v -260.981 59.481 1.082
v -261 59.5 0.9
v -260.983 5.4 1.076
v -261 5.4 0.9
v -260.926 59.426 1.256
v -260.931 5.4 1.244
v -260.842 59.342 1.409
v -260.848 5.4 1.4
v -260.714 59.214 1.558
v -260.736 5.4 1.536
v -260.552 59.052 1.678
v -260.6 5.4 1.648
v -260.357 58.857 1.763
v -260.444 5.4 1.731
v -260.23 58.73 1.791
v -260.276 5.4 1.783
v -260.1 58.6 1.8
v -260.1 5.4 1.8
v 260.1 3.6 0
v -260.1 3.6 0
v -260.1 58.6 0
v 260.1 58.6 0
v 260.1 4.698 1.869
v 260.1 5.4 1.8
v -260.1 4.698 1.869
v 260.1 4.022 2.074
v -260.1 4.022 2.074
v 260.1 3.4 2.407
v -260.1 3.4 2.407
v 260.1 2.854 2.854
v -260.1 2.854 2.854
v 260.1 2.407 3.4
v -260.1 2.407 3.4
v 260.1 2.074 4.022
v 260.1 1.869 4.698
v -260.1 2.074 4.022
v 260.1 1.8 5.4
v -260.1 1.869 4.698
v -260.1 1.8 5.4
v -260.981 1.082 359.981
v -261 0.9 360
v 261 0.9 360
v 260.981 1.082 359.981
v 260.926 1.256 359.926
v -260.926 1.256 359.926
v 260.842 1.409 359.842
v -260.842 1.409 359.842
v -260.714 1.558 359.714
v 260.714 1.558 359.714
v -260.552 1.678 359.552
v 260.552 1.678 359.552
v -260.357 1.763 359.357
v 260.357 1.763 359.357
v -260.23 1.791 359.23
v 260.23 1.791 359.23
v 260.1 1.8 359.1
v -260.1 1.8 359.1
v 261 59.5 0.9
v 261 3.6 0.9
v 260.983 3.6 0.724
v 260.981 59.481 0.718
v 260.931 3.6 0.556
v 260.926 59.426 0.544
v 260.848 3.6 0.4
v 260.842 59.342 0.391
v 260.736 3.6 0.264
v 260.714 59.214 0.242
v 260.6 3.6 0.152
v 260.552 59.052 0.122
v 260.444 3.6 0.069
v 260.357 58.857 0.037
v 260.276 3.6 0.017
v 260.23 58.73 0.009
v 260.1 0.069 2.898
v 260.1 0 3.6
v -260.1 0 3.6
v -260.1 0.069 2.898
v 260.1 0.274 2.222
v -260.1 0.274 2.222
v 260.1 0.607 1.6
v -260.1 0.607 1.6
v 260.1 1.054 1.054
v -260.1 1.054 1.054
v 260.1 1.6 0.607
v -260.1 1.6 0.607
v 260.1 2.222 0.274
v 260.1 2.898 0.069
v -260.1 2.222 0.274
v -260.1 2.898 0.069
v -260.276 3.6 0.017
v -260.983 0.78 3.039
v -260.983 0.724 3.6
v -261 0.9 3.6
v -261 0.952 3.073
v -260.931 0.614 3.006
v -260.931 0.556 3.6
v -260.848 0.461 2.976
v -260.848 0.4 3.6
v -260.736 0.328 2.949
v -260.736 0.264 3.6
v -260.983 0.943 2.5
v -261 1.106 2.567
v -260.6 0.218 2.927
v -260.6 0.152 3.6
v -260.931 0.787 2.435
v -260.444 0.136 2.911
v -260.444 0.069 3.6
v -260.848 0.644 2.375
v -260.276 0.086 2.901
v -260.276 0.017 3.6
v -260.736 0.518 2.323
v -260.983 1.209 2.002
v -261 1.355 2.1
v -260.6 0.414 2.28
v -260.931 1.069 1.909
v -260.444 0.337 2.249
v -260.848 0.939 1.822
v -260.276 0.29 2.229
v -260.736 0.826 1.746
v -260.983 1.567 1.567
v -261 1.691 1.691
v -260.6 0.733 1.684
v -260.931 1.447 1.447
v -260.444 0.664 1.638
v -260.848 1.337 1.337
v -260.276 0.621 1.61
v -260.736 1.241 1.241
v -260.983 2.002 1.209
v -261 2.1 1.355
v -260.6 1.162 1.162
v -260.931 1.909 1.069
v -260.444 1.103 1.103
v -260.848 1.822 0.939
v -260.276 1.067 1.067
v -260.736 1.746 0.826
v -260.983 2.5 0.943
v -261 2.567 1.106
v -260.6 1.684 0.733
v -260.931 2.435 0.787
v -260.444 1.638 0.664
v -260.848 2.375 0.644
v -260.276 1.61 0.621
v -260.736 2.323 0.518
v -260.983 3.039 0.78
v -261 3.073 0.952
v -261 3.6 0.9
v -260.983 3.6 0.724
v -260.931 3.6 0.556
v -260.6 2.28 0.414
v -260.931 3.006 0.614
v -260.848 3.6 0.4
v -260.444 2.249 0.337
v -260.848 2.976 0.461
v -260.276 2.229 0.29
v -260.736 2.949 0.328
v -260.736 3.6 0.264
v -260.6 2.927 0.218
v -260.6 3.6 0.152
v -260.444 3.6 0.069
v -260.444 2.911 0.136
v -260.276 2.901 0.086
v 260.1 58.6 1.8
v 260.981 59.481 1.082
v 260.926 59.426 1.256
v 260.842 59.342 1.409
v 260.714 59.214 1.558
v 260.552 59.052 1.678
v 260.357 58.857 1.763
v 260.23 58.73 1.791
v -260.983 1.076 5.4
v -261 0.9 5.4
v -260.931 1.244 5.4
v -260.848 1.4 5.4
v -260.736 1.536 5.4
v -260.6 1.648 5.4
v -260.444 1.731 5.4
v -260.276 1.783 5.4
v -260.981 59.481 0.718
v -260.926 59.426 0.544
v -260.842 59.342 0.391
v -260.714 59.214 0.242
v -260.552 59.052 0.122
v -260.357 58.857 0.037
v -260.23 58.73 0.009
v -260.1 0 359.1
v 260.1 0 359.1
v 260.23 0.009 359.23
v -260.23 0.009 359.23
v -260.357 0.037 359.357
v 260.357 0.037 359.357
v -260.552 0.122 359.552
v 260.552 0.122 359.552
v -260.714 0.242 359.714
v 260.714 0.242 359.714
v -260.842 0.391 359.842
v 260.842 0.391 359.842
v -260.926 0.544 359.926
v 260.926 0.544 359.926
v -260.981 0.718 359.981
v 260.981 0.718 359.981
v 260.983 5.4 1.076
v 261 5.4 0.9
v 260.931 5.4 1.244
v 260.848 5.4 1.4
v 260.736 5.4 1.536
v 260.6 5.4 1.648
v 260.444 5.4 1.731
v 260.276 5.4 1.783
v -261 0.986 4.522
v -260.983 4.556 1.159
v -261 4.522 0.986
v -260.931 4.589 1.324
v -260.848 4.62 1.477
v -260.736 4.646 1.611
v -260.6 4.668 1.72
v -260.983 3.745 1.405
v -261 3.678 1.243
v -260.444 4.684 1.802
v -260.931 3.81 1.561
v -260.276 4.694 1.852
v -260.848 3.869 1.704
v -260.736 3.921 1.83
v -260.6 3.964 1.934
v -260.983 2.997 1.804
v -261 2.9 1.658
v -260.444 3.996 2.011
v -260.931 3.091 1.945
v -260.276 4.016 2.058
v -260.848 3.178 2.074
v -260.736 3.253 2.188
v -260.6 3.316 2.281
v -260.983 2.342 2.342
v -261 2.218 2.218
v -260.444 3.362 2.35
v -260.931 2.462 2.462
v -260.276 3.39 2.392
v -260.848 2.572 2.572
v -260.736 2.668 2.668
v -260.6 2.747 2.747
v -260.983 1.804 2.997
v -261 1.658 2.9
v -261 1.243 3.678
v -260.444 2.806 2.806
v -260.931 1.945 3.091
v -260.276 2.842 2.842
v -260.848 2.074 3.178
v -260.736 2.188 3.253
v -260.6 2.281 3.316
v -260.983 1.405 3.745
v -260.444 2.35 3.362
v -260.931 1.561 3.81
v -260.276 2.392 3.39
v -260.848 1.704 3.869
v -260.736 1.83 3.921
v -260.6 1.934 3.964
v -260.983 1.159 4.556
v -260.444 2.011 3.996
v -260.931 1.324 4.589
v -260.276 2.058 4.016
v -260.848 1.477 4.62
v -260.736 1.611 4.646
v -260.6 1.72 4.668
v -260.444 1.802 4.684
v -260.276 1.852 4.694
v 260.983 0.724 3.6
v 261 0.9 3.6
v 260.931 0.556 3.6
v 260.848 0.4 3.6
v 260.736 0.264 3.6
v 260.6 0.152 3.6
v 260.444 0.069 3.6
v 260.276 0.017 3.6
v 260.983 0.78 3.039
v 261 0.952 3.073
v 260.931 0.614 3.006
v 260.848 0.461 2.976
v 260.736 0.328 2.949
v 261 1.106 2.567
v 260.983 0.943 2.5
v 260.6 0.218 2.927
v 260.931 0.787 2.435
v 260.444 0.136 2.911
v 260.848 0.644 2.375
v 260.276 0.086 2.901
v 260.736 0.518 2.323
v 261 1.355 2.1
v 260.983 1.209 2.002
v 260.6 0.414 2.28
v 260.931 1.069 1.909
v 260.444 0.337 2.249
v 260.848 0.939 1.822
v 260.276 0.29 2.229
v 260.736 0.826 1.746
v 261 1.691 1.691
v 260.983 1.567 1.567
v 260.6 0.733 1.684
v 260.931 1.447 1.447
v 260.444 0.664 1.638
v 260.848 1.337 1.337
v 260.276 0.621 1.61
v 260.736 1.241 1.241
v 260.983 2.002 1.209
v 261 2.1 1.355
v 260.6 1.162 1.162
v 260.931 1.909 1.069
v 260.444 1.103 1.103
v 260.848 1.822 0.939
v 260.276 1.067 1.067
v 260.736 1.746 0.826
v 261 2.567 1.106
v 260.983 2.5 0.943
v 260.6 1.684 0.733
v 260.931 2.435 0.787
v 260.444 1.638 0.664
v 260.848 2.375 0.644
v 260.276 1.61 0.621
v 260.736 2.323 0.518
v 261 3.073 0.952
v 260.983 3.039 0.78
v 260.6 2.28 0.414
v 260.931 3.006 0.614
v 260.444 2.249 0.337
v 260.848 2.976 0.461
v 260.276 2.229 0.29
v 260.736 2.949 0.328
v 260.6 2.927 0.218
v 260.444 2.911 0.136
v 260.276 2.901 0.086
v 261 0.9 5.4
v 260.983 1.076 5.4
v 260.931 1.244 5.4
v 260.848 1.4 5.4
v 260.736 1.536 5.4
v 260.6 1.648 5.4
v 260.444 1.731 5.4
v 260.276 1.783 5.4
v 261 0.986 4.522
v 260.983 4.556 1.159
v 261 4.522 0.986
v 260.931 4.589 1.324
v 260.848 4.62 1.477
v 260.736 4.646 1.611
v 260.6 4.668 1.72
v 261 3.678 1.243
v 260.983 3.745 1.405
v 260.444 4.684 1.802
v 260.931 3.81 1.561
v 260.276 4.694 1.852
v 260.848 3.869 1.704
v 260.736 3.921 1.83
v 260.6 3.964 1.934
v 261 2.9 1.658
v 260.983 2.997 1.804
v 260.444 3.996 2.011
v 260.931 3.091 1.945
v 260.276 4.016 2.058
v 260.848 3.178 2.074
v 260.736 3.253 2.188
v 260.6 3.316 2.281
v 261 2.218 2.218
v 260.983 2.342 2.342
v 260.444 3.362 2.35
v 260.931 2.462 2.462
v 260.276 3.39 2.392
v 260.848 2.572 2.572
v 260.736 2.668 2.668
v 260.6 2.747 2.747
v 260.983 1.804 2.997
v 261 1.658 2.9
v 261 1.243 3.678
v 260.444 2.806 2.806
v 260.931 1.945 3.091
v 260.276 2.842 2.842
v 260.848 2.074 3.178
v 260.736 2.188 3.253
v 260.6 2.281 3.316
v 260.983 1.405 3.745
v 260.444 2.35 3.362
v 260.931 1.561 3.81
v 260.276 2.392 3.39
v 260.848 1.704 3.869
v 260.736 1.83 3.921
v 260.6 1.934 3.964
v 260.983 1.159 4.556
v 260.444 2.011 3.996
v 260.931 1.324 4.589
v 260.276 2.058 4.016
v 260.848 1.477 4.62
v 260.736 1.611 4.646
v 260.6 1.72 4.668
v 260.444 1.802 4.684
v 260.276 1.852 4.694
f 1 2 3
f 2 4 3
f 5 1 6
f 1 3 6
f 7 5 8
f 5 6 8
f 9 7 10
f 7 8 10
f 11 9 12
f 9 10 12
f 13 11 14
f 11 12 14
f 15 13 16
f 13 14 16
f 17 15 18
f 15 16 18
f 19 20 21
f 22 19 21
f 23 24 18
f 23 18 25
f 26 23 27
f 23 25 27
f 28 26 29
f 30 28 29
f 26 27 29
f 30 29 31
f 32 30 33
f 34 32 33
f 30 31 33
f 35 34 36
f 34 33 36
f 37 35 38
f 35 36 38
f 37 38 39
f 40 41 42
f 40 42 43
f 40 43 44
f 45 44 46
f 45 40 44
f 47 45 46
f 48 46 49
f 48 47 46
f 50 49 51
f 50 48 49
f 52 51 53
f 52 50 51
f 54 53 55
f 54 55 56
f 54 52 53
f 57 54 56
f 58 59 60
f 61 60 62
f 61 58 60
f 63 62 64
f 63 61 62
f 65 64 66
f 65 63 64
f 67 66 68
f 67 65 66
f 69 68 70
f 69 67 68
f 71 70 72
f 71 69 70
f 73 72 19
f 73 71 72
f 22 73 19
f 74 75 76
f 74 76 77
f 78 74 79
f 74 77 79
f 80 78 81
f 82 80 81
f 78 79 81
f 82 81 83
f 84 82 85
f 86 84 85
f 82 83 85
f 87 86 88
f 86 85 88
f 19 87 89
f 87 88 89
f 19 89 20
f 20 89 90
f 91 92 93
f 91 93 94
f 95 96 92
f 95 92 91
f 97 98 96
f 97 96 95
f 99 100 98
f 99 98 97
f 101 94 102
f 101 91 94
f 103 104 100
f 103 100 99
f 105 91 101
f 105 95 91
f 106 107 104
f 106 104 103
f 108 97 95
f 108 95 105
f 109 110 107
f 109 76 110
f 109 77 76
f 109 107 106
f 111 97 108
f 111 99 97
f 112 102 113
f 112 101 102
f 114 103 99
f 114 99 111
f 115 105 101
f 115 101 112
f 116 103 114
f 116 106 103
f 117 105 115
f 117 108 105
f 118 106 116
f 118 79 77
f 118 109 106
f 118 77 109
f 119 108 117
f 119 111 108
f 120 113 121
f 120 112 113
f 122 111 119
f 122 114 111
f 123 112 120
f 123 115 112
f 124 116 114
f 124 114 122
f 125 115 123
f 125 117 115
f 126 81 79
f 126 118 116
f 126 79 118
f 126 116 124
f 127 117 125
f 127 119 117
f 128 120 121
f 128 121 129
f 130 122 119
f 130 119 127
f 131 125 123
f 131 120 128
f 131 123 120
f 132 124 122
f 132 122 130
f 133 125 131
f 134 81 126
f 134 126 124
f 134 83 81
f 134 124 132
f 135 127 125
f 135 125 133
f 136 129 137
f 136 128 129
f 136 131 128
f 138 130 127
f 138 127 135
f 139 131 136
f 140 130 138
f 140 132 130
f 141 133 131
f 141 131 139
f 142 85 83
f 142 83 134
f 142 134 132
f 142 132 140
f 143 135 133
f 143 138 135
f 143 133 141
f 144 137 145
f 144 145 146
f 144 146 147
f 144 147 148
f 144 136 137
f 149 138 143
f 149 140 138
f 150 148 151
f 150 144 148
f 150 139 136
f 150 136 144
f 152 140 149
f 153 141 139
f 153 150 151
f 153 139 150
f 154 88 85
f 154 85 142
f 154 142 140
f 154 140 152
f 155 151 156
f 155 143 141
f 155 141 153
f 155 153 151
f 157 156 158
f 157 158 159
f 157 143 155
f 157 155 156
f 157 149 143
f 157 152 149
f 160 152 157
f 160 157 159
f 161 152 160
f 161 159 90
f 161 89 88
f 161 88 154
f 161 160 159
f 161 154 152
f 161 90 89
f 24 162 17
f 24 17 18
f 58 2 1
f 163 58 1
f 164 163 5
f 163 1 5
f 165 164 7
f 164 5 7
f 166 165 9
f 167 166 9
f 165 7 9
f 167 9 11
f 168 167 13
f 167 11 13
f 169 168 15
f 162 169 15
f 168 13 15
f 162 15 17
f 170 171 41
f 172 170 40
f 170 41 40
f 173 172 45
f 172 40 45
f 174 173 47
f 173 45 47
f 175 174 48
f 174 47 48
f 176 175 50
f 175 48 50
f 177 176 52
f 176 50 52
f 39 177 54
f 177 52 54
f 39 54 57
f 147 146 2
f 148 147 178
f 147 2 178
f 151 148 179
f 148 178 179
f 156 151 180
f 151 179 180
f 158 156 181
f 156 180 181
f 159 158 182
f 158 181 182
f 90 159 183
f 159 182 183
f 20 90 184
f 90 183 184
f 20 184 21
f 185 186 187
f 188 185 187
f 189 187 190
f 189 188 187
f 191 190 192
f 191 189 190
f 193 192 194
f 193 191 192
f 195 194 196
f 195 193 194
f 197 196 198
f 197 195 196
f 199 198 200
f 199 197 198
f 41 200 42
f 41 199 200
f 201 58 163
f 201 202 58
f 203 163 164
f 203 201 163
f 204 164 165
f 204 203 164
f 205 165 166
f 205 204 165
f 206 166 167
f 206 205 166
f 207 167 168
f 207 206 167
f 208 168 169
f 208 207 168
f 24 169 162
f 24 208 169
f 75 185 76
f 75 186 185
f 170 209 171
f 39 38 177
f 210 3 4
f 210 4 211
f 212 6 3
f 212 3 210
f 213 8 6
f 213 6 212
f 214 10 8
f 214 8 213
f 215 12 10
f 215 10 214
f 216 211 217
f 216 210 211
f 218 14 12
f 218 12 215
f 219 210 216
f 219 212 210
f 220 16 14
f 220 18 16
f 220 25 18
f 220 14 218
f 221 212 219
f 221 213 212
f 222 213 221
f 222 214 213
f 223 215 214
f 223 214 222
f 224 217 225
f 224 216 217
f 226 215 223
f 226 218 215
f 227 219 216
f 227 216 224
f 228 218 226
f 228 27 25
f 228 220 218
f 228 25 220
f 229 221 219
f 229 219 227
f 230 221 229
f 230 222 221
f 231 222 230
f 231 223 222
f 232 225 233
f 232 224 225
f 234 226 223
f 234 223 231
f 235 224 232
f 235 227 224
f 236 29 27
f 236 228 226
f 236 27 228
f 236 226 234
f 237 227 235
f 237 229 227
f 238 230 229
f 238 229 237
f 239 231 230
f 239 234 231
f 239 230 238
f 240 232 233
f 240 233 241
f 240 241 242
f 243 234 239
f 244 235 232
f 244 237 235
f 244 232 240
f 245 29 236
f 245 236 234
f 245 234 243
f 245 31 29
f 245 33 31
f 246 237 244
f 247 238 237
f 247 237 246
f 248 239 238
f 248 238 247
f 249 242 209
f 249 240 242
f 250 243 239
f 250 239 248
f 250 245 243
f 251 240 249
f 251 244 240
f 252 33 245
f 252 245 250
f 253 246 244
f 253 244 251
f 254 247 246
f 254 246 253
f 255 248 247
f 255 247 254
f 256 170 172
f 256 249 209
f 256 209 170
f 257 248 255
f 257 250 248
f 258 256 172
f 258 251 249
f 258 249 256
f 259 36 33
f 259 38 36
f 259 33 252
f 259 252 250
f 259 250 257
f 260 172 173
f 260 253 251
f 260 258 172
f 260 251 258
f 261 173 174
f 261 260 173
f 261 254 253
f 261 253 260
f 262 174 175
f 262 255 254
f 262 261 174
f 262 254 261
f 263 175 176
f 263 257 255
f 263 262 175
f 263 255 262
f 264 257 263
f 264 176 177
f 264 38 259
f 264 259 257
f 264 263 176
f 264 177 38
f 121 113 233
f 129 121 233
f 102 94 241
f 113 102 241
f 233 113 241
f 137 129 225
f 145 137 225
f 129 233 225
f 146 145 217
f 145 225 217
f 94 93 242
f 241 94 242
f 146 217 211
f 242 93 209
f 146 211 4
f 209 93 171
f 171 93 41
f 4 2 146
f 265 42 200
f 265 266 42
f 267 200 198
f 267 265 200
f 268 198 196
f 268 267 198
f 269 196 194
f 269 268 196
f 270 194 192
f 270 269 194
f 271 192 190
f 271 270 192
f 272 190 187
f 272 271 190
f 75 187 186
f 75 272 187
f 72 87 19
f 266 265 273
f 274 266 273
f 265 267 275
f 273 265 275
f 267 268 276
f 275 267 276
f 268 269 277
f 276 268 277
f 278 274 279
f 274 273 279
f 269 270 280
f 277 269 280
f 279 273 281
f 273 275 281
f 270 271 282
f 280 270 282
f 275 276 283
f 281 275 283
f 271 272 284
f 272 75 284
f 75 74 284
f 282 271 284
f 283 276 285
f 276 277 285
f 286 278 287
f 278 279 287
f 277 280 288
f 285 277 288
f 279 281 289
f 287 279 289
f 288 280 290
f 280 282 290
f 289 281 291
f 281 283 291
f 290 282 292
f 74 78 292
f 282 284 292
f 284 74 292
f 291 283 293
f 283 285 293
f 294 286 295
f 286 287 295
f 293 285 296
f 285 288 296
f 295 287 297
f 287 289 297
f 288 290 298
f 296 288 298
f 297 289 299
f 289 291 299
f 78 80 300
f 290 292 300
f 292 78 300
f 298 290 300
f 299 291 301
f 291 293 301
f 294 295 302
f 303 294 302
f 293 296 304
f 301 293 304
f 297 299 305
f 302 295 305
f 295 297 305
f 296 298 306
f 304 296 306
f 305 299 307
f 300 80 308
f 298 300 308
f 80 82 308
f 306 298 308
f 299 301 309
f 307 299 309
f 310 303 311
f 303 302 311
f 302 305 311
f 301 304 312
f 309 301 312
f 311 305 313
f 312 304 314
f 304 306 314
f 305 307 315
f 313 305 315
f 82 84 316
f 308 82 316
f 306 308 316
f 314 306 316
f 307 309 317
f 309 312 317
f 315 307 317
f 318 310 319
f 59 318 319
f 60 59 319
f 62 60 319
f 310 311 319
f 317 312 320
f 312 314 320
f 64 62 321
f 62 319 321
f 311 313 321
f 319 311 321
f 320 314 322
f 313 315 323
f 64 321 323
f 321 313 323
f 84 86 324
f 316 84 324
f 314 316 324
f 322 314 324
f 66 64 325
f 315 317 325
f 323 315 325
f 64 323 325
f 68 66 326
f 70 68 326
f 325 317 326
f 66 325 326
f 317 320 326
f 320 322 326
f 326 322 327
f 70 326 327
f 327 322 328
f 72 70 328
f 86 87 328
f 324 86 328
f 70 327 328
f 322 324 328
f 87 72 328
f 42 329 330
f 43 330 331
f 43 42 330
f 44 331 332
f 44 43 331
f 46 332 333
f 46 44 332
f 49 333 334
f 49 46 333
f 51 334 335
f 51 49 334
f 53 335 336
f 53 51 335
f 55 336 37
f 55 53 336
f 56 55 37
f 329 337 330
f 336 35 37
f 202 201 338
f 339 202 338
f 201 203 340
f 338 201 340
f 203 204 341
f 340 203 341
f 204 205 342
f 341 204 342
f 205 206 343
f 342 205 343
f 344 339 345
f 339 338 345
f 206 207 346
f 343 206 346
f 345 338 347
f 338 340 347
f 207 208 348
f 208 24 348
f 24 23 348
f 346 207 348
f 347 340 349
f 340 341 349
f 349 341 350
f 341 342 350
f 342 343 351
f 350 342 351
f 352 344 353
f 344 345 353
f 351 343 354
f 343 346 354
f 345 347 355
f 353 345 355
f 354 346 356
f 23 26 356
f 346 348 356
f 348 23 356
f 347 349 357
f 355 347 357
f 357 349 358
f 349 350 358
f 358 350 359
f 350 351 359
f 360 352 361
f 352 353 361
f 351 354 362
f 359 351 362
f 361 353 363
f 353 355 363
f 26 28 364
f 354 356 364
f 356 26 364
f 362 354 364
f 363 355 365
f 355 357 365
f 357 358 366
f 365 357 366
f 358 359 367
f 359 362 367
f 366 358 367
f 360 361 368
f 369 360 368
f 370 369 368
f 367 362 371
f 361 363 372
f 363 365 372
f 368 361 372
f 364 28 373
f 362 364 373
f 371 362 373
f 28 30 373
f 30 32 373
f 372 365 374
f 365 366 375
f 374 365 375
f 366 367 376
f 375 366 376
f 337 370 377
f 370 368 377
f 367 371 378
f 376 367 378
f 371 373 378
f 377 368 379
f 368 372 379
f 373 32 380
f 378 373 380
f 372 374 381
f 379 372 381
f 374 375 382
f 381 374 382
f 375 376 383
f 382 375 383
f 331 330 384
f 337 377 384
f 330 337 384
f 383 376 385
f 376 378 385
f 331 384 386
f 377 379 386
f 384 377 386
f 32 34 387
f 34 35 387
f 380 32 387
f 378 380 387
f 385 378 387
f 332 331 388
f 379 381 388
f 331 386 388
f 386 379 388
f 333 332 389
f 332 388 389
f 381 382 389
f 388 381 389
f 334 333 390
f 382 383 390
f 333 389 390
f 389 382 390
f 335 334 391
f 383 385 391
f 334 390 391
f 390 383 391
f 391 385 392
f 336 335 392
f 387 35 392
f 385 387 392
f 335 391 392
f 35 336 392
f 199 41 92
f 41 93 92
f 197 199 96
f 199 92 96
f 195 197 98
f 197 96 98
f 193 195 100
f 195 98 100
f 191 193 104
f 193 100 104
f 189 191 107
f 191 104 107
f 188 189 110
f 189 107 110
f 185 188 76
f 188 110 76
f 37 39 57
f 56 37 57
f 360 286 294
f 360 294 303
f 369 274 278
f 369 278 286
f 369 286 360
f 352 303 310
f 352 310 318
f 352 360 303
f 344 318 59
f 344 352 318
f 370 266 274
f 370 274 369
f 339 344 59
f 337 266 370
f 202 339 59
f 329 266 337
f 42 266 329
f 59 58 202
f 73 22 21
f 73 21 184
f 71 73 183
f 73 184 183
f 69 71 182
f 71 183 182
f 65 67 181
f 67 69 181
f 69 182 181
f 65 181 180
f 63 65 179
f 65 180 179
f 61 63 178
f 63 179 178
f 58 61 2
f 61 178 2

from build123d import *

# Parameters (mm, degrees)
F2_DEPTH = 261
F3_R     = 3.6
F4_R     = 0.89999


# Not quite as in the source:
# - a fillet or chamfer is up to 0.001 mm smaller than in the source, because OpenCascade refuses the exact size


with BuildPart() as f2:
    # F1 (on Right) → F2 (new body)
    with BuildSketch(Plane.YZ):
        Polygon((0, 360), (0, 0), (59.5, 0), (59.5, 1.8), (1.8, 1.8), (1.8, 360), align=None)
    extrude(amount=F2_DEPTH)

    # F3
    f3_edges = [f2.edges().sort_by_distance(p)[0] for p in [
        (130.5, 1.8, 1.8),
        (130.5, 0, 0),
    ]]
    fillet(f3_edges, radius=F3_R)

    # F4 (radius 0.9 in the source; OpenCascade refuses exactly that, so slightly less here)
    f4_edges = [f2.edges().sort_by_distance(p)[0] for p in [
        (261, 32.45, 1.8),
        (261, 31.55, 0),
        (130.5, 59.5, 1.8),
        (130.5, 59.5, 0),
        (261, 1.8, 182.7),
        (261, 0, 181.8),
        (130.5, 0, 360),
        (130.5, 1.8, 360),
        (261, 1.054416, 1.054416),
    ]]
    fillet(f4_edges, radius=F4_R)

    # F5: F2 across face


with BuildPart() as f2_1:
    add(f2.part)
    add(f2.part.mirror(Plane(origin=(0, 4.9930290886, 155.2430290886), x_dir=(0, 1, 0), z_dir=(-1, 0, 0))))


solid = f2_1.part
